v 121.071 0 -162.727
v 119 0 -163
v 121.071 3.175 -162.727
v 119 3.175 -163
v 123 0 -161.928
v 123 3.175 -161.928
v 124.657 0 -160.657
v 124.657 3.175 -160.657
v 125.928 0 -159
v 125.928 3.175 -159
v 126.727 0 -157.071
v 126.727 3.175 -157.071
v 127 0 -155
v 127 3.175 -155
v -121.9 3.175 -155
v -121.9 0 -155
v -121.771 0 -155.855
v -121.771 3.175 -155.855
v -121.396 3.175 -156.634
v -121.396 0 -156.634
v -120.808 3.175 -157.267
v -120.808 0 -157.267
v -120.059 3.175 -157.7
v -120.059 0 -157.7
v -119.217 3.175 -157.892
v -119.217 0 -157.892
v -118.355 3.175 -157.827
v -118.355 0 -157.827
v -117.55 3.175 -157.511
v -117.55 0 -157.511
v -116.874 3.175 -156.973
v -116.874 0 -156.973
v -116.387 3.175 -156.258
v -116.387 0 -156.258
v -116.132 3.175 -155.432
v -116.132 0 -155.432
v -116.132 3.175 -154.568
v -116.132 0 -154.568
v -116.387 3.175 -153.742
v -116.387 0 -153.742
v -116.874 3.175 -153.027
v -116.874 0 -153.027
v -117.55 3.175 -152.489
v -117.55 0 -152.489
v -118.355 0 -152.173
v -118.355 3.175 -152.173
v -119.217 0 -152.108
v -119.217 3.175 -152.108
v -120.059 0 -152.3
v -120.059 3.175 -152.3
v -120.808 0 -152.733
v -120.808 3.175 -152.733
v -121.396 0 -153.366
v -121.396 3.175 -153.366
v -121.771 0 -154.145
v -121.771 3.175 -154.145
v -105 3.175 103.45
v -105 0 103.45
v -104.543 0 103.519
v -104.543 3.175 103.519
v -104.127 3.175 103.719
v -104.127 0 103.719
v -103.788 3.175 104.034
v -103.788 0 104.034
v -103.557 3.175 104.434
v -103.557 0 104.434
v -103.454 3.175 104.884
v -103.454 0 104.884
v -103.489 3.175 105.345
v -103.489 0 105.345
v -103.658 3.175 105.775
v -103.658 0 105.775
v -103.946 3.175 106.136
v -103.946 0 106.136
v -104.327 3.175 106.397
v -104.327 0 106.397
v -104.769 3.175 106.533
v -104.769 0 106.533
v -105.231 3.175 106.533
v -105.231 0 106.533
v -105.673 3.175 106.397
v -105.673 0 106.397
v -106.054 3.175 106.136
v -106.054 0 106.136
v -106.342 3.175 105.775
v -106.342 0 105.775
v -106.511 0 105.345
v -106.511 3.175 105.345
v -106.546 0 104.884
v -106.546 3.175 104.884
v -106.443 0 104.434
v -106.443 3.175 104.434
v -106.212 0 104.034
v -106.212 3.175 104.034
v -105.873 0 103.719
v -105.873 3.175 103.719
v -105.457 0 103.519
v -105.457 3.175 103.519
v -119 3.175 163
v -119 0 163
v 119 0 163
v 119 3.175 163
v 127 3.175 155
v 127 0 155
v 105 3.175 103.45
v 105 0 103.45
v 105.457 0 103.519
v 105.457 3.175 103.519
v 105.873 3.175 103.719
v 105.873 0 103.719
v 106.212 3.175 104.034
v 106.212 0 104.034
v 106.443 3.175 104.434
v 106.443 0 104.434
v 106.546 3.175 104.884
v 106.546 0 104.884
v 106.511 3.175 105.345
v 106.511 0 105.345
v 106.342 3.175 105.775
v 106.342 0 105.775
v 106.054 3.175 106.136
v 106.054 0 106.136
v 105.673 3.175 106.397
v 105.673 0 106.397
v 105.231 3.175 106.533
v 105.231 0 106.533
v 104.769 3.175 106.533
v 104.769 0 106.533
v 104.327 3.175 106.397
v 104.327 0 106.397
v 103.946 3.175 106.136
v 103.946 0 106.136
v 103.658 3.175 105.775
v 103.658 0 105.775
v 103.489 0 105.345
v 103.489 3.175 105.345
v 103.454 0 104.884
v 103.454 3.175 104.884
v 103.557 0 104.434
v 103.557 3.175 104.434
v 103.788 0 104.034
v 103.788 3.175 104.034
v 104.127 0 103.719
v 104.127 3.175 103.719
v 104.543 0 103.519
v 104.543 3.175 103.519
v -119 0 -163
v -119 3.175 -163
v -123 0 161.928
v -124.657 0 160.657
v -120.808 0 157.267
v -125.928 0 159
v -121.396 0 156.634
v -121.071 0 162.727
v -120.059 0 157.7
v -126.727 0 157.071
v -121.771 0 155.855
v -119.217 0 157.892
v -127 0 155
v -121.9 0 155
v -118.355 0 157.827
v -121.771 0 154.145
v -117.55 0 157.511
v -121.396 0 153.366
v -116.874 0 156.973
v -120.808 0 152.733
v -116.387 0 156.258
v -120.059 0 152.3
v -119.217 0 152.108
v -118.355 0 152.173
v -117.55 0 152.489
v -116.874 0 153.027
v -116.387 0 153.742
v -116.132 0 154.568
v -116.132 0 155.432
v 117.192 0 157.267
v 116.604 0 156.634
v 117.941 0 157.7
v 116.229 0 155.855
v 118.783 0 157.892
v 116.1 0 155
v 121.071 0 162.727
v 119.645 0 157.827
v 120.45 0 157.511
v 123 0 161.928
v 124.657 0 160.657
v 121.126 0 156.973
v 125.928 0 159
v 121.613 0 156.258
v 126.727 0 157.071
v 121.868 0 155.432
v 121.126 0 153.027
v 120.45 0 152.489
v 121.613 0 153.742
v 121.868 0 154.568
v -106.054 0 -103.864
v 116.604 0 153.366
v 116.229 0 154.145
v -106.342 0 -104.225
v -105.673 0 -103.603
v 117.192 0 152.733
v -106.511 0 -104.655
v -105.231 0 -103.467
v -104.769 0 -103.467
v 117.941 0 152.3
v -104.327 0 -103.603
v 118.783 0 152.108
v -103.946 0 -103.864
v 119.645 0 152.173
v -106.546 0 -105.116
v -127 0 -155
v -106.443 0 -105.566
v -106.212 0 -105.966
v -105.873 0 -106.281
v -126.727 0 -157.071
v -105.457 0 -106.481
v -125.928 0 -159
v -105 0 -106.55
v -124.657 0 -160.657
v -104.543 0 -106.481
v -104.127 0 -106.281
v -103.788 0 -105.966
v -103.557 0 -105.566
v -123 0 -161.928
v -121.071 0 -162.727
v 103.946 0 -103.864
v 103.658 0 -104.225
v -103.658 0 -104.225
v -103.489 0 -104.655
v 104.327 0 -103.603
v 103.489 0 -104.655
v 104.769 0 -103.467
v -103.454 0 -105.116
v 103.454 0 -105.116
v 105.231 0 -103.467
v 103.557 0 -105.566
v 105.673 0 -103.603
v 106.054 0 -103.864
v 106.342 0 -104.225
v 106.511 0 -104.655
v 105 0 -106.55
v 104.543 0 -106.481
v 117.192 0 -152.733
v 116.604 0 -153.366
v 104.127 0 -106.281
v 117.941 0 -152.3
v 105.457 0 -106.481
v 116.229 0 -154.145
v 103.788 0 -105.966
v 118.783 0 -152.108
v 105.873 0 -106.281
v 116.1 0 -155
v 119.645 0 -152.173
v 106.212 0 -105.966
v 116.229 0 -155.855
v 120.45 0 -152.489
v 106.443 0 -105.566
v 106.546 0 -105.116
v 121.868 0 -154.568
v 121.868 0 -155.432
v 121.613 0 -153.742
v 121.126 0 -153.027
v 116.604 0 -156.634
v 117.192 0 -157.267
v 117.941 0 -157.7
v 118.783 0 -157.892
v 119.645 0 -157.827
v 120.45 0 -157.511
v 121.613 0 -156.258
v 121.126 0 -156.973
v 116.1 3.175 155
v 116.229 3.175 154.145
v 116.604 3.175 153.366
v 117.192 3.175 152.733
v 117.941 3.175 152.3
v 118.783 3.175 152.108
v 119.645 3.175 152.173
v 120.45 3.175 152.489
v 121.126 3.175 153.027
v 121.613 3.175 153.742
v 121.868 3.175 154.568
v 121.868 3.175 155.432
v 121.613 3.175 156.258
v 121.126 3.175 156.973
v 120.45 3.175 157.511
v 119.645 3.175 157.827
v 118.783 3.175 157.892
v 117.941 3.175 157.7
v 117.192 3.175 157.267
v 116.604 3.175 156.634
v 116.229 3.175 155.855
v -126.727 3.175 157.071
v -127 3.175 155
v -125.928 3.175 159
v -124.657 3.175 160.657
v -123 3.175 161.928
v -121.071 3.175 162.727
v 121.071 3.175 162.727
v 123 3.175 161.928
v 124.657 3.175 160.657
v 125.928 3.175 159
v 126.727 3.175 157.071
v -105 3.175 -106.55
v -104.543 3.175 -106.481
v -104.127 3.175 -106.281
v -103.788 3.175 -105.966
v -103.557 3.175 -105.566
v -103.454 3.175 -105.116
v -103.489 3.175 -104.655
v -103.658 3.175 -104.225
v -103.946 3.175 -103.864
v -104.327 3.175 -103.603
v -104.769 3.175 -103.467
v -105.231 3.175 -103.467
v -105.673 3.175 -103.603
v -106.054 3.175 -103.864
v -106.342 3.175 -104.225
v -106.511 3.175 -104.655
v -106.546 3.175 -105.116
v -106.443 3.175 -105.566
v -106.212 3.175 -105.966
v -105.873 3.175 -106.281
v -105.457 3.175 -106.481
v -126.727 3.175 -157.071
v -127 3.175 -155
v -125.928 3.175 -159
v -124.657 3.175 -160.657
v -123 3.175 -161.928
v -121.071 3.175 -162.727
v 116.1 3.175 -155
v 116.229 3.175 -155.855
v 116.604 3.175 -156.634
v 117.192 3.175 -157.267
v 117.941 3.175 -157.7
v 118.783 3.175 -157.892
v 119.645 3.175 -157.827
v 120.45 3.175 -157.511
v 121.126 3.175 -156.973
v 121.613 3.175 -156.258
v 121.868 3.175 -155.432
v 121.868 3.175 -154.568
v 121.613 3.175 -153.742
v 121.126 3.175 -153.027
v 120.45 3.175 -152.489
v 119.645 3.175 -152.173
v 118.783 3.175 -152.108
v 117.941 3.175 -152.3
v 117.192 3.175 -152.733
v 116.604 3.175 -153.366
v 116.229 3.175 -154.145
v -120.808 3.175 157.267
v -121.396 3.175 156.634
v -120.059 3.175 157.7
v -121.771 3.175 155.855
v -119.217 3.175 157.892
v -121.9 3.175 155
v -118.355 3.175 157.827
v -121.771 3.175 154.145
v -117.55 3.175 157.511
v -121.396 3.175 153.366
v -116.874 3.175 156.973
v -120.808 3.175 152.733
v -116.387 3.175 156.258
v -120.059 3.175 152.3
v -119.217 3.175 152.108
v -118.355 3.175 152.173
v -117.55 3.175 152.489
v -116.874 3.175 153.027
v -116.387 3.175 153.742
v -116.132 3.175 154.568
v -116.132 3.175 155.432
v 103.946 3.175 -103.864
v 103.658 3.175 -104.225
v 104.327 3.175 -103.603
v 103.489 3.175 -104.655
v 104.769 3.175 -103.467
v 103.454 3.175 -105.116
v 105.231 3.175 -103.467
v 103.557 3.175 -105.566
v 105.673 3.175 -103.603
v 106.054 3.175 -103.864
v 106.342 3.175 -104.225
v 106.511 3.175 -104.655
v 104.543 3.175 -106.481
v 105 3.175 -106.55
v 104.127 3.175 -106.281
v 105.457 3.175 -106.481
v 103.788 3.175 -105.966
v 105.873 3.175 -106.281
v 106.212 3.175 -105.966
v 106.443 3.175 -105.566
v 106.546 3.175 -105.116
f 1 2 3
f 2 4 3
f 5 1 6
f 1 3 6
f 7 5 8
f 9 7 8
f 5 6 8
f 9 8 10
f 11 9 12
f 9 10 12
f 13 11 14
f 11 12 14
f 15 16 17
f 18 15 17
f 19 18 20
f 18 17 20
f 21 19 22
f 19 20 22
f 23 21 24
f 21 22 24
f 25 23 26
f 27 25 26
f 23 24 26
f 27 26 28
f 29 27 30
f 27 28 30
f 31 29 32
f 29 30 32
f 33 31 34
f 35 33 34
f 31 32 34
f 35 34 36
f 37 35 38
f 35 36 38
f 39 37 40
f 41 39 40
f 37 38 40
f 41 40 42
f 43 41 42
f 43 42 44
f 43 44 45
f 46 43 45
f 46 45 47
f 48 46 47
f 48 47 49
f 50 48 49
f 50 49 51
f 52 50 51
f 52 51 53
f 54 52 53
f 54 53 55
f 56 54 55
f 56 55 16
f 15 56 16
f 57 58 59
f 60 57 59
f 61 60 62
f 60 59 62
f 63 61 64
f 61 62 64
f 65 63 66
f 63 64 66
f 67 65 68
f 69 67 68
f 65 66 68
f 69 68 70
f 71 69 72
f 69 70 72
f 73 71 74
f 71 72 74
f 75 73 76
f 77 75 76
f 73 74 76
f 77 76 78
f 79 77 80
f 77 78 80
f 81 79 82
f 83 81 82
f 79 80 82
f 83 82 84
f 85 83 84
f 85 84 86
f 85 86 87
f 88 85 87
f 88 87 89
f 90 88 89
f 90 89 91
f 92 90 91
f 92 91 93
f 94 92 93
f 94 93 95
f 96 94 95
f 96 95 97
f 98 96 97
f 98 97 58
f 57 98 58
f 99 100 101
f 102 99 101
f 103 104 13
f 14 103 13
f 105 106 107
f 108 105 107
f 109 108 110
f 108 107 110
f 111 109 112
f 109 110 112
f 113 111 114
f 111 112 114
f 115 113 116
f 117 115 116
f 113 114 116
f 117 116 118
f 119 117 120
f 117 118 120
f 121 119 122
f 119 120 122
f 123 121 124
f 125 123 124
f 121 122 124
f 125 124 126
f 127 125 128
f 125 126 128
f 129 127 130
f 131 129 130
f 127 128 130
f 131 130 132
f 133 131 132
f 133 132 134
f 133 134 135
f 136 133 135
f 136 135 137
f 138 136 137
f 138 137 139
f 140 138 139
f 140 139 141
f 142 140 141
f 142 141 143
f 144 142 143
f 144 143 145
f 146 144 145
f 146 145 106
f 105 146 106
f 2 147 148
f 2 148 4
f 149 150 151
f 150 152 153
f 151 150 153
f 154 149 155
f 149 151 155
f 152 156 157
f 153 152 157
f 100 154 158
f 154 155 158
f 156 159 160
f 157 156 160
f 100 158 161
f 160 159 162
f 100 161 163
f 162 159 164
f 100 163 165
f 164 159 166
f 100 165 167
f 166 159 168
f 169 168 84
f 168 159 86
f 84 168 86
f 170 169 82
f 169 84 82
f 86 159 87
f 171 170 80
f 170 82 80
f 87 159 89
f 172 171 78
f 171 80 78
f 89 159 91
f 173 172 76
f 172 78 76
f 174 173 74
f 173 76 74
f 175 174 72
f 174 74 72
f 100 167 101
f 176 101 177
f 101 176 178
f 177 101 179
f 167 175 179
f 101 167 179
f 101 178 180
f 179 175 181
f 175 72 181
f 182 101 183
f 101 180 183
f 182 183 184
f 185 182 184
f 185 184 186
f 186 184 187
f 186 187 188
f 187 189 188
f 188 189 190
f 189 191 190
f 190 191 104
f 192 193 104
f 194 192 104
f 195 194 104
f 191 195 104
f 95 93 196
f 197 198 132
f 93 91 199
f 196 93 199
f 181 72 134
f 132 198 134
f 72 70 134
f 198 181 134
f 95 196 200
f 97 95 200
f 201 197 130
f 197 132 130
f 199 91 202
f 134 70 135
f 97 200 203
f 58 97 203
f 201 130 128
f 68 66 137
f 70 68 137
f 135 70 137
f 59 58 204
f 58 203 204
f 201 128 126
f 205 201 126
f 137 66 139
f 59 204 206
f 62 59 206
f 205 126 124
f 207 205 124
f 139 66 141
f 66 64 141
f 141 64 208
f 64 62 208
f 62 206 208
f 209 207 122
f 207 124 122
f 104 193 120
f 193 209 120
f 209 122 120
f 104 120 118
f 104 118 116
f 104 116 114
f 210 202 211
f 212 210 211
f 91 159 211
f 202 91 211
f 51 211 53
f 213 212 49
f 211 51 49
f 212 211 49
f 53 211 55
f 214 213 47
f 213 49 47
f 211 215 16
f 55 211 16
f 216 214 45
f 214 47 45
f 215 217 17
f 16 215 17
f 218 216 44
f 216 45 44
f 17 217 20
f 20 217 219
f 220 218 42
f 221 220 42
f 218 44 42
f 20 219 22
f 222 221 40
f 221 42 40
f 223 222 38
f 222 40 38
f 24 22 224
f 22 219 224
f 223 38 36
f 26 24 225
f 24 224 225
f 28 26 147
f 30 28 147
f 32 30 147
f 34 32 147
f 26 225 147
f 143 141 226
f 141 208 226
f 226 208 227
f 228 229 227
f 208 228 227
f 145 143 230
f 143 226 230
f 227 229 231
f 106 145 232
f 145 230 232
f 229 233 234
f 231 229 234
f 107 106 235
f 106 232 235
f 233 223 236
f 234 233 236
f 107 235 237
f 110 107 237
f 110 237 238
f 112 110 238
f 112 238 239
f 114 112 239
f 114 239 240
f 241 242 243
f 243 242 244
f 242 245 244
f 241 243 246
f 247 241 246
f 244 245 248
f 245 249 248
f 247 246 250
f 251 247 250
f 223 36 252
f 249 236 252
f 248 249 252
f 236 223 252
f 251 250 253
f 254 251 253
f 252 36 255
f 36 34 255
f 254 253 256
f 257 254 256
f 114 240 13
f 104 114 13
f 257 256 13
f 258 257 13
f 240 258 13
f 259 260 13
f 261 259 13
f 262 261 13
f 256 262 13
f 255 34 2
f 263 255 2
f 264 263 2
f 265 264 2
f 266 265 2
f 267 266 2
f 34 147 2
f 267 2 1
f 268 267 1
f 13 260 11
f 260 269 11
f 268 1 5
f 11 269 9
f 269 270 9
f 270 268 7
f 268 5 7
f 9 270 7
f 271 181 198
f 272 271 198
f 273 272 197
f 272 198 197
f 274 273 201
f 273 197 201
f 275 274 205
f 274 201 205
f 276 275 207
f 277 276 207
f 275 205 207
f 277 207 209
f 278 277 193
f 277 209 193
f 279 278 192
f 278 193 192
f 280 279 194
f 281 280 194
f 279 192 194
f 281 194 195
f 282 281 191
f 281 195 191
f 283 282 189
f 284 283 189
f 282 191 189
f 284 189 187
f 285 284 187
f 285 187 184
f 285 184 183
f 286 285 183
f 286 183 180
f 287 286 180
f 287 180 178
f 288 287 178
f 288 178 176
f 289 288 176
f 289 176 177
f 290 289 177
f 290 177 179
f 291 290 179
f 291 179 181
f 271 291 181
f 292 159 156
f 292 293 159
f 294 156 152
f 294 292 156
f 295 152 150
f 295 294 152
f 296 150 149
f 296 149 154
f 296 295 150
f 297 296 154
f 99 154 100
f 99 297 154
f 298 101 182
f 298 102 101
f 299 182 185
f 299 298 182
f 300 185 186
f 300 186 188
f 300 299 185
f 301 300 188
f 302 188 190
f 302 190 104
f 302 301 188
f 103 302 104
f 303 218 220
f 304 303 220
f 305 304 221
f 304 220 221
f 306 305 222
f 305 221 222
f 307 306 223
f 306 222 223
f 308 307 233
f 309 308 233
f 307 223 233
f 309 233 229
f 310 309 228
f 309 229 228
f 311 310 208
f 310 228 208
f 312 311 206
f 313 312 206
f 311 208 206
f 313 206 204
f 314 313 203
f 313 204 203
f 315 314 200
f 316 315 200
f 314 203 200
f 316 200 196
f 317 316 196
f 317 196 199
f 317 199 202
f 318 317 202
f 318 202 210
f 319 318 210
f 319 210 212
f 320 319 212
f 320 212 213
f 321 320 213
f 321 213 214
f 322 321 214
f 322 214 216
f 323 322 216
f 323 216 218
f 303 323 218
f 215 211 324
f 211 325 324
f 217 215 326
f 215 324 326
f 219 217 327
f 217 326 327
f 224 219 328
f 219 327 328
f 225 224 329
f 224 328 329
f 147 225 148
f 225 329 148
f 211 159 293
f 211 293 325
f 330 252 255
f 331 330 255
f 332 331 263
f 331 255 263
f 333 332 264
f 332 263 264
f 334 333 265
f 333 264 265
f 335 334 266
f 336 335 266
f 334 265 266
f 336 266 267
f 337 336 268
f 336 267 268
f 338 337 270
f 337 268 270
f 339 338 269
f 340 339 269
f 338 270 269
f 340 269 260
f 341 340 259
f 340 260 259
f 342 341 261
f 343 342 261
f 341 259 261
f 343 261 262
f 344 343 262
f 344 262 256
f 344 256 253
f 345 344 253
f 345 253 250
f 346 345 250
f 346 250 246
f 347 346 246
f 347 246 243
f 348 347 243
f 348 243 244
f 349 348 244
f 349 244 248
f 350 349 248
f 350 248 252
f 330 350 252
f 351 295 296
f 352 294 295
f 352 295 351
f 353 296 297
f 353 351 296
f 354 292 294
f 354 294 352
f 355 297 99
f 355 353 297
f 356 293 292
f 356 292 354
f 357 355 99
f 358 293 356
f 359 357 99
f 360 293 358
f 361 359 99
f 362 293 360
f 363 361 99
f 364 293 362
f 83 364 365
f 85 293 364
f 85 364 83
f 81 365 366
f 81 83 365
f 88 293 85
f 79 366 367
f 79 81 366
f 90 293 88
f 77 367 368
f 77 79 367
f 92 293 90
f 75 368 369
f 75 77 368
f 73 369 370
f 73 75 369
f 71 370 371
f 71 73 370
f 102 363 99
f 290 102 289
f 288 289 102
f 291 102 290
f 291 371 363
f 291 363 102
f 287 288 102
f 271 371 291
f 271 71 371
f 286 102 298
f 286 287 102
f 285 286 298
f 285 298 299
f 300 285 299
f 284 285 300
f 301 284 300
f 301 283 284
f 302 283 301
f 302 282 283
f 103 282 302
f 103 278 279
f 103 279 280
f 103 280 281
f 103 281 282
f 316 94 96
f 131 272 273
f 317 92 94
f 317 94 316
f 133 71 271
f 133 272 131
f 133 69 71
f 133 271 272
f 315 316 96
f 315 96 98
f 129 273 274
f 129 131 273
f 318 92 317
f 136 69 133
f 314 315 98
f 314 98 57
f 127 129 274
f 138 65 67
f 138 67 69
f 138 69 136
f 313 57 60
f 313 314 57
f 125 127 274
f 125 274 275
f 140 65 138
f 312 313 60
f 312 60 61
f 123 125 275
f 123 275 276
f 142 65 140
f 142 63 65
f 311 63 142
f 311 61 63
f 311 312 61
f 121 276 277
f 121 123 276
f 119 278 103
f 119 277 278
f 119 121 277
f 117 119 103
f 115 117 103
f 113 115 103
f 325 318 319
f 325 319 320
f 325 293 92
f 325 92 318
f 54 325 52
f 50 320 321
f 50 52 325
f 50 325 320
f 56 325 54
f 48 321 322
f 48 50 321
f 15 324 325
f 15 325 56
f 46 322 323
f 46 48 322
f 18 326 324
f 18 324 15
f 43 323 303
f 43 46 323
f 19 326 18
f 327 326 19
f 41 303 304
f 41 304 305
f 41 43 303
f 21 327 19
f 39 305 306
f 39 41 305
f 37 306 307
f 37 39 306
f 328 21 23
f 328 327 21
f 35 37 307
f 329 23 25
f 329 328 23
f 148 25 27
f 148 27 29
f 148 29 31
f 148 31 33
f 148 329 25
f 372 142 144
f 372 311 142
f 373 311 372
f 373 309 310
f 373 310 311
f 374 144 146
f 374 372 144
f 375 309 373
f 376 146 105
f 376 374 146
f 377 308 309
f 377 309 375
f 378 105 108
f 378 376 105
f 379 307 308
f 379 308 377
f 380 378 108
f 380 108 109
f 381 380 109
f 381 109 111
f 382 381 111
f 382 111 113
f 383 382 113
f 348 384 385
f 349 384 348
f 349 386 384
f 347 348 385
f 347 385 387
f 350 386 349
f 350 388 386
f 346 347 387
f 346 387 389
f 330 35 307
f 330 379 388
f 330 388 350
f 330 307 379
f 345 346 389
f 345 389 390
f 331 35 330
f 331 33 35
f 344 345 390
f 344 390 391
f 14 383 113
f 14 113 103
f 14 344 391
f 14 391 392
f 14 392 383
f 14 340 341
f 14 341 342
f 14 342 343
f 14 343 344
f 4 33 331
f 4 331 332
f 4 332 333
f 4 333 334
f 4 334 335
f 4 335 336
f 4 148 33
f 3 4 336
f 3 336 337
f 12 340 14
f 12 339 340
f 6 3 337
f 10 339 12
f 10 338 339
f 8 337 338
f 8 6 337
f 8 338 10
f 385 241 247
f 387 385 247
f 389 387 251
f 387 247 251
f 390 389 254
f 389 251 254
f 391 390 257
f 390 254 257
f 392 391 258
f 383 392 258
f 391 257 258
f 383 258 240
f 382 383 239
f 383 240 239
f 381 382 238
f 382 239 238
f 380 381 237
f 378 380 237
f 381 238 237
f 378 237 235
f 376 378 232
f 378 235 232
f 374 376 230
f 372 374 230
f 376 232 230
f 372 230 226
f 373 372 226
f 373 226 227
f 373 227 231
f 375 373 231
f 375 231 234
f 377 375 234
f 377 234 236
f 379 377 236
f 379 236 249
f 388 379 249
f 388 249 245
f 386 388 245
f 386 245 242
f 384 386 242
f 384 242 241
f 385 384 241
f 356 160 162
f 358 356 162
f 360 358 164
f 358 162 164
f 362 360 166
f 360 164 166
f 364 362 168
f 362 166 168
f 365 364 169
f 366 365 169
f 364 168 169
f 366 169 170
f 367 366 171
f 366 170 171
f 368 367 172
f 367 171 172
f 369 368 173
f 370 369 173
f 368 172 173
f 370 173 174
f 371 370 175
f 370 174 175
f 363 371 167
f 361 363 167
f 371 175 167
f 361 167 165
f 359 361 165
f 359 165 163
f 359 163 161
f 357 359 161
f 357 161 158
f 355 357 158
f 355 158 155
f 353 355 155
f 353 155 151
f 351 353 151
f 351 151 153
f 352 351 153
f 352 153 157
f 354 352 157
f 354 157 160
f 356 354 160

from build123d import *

# Parameters (mm, degrees)
SKETCH1_W                  = 254
SKETCH1_H                  = 326
BOSS_EXTRUDE1_DEPTH        = 3.175
M2_5_CLEARANCE_HOLE1_D     = 3.1
M2_5_CLEARANCE_HOLE1_DEPTH = 11.938
M2_5_CLEARANCE_HOLE1_TIP   = 0.931333959
M5_CLEARANCE_HOLE1_D       = 5.8
M5_CLEARANCE_HOLE1_DEPTH   = 11.938
M5_CLEARANCE_HOLE1_TIP     = 1.742495795
FILLET1_R                  = 8


with BuildPart() as part:
    # Sketch1 → Boss-Extrude1 (new body)
    with BuildSketch(Plane(origin=(0, 0, 0), x_dir=(1, 0, 0), z_dir=(0, 1, 0))):
        Rectangle(SKETCH1_W, SKETCH1_H)
    extrude(amount=BOSS_EXTRUDE1_DEPTH)

    # M2.5 Clearance Hole1
    with Locations(Plane(origin=(-105, 3.175, 105), x_dir=(0, 0, 1), z_dir=(0, 1, 0))):
        with Locations((0, 0), (-210, 0), (-210, 210), (0, 210)):
            Hole(M2_5_CLEARANCE_HOLE1_D / 2, depth=M2_5_CLEARANCE_HOLE1_DEPTH)
            with Locations((0, 0, -(M2_5_CLEARANCE_HOLE1_DEPTH + M2_5_CLEARANCE_HOLE1_TIP / 2))):  # 118° drill point
                Cone(0, M2_5_CLEARANCE_HOLE1_D / 2, M2_5_CLEARANCE_HOLE1_TIP, mode=Mode.SUBTRACT)

    # M5 Clearance Hole1
    with Locations(Plane(origin=(0, 3.175, 0), x_dir=(1, 0, 0), z_dir=(0, 1, 0))):
        with Locations((-119, 155), (119, 155), (119, -155), (-119, -155)):
            Hole(M5_CLEARANCE_HOLE1_D / 2, depth=M5_CLEARANCE_HOLE1_DEPTH)
            with Locations((0, 0, -(M5_CLEARANCE_HOLE1_DEPTH + M5_CLEARANCE_HOLE1_TIP / 2))):  # 118° drill point
                Cone(0, M5_CLEARANCE_HOLE1_D / 2, M5_CLEARANCE_HOLE1_TIP, mode=Mode.SUBTRACT)

    # Fillet1
    fillet1_edges = [part.edges().sort_by_distance(p)[0] for p in [
        (-127, 1.5875, -163),
        (127, 1.5875, -163),
        (127, 1.5875, 163),
        (-127, 1.5875, 163),
    ]]
    fillet(fillet1_edges, radius=FILLET1_R)


solid = part.part
